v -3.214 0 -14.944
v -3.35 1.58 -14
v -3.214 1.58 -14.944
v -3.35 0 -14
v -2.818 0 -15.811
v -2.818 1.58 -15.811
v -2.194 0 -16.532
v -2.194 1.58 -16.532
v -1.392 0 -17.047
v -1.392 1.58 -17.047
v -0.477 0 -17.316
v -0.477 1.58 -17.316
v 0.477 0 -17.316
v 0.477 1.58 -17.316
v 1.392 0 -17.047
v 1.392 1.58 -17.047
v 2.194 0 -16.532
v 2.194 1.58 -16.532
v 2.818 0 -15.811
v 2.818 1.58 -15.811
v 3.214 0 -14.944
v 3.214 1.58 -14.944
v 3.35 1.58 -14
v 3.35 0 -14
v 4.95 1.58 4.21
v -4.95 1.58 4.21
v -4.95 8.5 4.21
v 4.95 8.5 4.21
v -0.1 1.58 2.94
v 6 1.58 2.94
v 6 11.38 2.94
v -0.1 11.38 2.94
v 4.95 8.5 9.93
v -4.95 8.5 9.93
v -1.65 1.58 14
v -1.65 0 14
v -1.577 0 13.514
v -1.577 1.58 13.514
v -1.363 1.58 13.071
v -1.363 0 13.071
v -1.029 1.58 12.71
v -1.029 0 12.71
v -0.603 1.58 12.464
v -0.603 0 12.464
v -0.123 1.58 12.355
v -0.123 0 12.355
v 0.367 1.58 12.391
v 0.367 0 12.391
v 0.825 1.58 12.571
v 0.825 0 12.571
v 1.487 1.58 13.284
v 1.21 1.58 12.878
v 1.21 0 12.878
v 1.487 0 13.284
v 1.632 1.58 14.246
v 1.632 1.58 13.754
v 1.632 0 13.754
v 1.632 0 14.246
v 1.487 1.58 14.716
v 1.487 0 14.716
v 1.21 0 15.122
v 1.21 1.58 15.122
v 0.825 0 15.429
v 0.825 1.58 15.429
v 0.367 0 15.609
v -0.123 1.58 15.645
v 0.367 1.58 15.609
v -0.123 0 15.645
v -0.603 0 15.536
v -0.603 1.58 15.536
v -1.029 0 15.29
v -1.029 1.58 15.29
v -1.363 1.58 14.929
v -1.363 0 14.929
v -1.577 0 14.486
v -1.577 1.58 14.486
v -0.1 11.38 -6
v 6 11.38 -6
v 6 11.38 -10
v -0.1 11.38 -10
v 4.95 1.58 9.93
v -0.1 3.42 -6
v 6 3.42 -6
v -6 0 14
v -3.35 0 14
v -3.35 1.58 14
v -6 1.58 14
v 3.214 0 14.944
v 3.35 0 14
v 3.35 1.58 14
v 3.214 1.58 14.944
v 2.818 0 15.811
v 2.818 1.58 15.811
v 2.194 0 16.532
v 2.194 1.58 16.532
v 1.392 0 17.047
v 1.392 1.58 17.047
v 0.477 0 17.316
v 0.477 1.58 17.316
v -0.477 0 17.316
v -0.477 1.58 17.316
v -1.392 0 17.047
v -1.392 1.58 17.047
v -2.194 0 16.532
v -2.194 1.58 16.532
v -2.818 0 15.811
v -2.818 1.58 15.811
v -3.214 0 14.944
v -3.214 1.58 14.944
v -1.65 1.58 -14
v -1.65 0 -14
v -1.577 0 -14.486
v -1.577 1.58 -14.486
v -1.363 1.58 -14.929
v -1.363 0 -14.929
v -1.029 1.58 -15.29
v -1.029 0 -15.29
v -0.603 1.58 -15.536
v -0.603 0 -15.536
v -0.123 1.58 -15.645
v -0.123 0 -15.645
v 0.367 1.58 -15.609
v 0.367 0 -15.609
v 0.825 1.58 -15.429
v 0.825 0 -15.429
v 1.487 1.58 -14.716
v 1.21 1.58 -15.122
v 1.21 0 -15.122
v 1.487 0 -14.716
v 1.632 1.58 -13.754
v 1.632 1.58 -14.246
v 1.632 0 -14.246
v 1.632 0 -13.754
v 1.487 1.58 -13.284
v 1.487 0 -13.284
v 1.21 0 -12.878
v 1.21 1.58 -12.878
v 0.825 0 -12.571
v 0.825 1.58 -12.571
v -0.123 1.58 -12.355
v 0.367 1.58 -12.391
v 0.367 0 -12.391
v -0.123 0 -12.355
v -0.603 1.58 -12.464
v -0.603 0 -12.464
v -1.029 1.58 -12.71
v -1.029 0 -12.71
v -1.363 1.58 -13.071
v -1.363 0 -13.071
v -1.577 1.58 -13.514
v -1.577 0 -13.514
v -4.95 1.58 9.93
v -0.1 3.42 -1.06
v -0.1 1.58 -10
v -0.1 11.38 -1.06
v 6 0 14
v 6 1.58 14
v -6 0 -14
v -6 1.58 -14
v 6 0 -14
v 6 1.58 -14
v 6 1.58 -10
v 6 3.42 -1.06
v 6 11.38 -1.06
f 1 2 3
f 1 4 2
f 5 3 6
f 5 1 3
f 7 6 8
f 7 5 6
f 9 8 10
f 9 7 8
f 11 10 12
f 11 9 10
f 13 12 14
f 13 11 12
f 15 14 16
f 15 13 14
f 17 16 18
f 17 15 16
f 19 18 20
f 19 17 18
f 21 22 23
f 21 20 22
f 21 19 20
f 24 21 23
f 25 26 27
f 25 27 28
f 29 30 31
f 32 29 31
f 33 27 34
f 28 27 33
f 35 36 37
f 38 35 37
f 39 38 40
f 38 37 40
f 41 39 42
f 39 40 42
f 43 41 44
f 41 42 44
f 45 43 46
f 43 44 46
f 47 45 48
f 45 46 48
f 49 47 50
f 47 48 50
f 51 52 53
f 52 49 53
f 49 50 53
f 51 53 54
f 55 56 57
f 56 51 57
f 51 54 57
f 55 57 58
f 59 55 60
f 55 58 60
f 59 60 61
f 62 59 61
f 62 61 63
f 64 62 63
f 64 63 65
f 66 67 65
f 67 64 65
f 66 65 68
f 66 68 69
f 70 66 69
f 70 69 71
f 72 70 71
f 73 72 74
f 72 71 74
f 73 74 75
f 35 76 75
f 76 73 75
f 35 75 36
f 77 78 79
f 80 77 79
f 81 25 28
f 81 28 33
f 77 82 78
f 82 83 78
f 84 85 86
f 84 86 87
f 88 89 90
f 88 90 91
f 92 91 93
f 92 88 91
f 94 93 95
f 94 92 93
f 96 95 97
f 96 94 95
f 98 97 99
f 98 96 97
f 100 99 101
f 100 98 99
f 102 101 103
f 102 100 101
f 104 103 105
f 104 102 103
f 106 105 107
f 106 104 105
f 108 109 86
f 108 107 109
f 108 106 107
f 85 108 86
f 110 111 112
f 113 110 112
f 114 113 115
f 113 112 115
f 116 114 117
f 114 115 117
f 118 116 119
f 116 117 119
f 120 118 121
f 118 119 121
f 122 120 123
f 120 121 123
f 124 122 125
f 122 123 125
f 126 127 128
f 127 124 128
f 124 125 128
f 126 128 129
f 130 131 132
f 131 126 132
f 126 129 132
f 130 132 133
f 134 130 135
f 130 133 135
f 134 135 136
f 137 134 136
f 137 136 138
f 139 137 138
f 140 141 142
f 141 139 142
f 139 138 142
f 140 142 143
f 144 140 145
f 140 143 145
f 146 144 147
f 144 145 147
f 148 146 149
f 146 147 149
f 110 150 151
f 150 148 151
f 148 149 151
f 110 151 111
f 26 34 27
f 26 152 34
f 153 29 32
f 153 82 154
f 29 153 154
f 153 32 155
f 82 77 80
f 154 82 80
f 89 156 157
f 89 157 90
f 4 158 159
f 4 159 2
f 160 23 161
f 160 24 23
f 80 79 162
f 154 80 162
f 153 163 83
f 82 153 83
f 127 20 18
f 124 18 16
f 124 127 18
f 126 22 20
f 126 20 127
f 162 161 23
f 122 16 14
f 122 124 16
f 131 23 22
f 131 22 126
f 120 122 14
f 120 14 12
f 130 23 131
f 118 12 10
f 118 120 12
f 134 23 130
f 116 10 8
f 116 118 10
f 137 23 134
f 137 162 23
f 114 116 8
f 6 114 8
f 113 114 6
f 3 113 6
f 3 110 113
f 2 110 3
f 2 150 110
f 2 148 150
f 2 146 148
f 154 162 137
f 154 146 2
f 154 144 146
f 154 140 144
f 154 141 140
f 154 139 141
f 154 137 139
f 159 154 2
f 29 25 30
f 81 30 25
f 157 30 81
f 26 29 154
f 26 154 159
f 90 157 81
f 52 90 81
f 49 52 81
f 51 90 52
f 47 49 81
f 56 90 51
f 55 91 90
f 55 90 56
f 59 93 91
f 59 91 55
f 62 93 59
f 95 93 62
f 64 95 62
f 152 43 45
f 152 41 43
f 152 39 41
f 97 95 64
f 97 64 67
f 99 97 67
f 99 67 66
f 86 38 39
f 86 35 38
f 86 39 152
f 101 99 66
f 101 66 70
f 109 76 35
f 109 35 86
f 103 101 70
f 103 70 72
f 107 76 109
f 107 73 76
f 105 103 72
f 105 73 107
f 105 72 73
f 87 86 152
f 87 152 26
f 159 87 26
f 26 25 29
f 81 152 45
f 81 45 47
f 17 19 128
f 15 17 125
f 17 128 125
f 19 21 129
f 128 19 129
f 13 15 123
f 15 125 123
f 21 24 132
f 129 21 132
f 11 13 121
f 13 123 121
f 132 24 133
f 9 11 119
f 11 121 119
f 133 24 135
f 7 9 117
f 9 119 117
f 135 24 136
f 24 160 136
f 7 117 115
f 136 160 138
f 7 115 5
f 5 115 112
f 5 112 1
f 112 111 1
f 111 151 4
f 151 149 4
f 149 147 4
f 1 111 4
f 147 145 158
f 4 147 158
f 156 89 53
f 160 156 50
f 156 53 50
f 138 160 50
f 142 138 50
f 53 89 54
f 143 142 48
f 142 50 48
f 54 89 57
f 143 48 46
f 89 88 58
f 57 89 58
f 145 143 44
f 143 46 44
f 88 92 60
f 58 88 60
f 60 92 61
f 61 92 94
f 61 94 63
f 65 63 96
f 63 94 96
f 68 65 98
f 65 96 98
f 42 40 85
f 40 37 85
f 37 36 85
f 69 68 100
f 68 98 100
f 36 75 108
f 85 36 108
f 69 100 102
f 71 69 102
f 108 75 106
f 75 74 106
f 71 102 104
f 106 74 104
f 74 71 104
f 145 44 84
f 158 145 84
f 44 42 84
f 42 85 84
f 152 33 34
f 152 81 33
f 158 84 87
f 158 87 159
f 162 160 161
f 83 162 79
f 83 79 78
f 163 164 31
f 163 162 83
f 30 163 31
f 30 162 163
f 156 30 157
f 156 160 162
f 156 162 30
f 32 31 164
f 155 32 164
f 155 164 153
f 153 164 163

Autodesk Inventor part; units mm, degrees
ref_plane "YZ Plane" through (0, 0, 0) normal (1, 0, 0) x (0, 1, 0)
ref_plane "XZ Plane" through (0, 0, 0) normal (0, 1, 0) x (-1, 0, 0)
ref_plane "XY Plane" through (0, 0, 0) normal (0, 0, 1) x (1, 0, 0)
sketch "草圖1" plane through (0, 0, 0) normal (0, 1, 0) x (-1, 0, 0)
  line L0 (6, 14) -> (6, -14)
  line L1 (-6, -14) -> (-6, 14)
  line L2 (-6, 14) -> (6, -14) construction
  line L3 (6, 14) -> (-6, -14) construction
  circle A0 centre (0, 14) radius 1.65
  circle A1 centre (0, -14) radius 1.65
  arc A2 (-3.35, -14) -> (3.35, -14) centre (0, -14) ccw
  arc A3 (3.35, 14) -> (-3.35, 14) centre (0, 14) ccw
  line L4 (-6, 14) -> (-3.35, 14)
  line L5 (1.65, 14) -> (6, 14)
  line L6 (6, -14) -> (3.35, -14)
  line L7 (-3.35, -14) -> (-6, -14)
  point P0 (0, 0)
  dimension "d2" = 3.3
  dimension "d0" = 12
  dimension "d1" = 28
  dimension "d3" = 3.3
  dimension "d4" = 6.7
  dimension "d5" = 6.7
extrude "擠出1" add sketch "草圖1" along normal blind 1.58
sketch "草圖2" plane through (6, 0, 14) normal (1, 0, 0) x (0, 0, -1)
  line L0 (0, 0) -> (28, 0) projected
  line L1 (28, 0) -> (28, 1.58) projected
  line L2 (0, 1.58) -> (28, 1.58) projected
  line L3 (0, 0) -> (0, 1.58) projected
  line L4 (11.06, 1.58) -> (11.06, 11.38)
  line L5 (11.06, 11.38) -> (15.06, 11.38)
  line L6 (15.06, 11.38) -> (15.06, 3.42)
  line L7 (15.06, 3.42) -> (20, 3.42)
  line L8 (20, 3.42) -> (20, 11.38)
  line L9 (20, 11.38) -> (24, 11.38)
  line L10 (24, 11.38) -> (24, 1.58)
  point P0 (14, 0)
  dimension "d8" = 12.94
  dimension "d9" = 4
  dimension "d10" = 4
  dimension "d11" = 4
  dimension "d12" = 7.96
  dimension "d13" = 9.8
extrude "擠出2" add sketch "草圖2" against normal blind 6.1 contours L4 L5 L6 L7 L8 L9 L10 L2
sketch "草圖3" plane through (0, 1.58, 0) normal (0, 1, 0) x (1, 0, 0)
  line L0 (4.95, -9.93) -> (-4.95, -9.93)
  line L1 (-4.95, -9.93) -> (-4.95, -4.21)
  line L2 (-4.95, -4.21) -> (4.95, -4.21)
  line L3 (4.95, -4.21) -> (4.95, -9.93)
  line L4 (4.95, -9.93) -> (-4.95, -4.21) construction
  line L5 (-4.95, -9.93) -> (4.95, -4.21) construction
  line L6 (6, -2.94) -> (-0.1, -2.94) projected
  line L7 (0, 0) -> (0, -12.3322) construction
  point P0 (0, -7.07)
  dimension "d16" = 1.27
  dimension "d17" = 5.72
  dimension "d18" = 9.9
extrude "擠出3" add sketch "草圖3" along normal blind 6.92
properties part number "optic endstop module"
